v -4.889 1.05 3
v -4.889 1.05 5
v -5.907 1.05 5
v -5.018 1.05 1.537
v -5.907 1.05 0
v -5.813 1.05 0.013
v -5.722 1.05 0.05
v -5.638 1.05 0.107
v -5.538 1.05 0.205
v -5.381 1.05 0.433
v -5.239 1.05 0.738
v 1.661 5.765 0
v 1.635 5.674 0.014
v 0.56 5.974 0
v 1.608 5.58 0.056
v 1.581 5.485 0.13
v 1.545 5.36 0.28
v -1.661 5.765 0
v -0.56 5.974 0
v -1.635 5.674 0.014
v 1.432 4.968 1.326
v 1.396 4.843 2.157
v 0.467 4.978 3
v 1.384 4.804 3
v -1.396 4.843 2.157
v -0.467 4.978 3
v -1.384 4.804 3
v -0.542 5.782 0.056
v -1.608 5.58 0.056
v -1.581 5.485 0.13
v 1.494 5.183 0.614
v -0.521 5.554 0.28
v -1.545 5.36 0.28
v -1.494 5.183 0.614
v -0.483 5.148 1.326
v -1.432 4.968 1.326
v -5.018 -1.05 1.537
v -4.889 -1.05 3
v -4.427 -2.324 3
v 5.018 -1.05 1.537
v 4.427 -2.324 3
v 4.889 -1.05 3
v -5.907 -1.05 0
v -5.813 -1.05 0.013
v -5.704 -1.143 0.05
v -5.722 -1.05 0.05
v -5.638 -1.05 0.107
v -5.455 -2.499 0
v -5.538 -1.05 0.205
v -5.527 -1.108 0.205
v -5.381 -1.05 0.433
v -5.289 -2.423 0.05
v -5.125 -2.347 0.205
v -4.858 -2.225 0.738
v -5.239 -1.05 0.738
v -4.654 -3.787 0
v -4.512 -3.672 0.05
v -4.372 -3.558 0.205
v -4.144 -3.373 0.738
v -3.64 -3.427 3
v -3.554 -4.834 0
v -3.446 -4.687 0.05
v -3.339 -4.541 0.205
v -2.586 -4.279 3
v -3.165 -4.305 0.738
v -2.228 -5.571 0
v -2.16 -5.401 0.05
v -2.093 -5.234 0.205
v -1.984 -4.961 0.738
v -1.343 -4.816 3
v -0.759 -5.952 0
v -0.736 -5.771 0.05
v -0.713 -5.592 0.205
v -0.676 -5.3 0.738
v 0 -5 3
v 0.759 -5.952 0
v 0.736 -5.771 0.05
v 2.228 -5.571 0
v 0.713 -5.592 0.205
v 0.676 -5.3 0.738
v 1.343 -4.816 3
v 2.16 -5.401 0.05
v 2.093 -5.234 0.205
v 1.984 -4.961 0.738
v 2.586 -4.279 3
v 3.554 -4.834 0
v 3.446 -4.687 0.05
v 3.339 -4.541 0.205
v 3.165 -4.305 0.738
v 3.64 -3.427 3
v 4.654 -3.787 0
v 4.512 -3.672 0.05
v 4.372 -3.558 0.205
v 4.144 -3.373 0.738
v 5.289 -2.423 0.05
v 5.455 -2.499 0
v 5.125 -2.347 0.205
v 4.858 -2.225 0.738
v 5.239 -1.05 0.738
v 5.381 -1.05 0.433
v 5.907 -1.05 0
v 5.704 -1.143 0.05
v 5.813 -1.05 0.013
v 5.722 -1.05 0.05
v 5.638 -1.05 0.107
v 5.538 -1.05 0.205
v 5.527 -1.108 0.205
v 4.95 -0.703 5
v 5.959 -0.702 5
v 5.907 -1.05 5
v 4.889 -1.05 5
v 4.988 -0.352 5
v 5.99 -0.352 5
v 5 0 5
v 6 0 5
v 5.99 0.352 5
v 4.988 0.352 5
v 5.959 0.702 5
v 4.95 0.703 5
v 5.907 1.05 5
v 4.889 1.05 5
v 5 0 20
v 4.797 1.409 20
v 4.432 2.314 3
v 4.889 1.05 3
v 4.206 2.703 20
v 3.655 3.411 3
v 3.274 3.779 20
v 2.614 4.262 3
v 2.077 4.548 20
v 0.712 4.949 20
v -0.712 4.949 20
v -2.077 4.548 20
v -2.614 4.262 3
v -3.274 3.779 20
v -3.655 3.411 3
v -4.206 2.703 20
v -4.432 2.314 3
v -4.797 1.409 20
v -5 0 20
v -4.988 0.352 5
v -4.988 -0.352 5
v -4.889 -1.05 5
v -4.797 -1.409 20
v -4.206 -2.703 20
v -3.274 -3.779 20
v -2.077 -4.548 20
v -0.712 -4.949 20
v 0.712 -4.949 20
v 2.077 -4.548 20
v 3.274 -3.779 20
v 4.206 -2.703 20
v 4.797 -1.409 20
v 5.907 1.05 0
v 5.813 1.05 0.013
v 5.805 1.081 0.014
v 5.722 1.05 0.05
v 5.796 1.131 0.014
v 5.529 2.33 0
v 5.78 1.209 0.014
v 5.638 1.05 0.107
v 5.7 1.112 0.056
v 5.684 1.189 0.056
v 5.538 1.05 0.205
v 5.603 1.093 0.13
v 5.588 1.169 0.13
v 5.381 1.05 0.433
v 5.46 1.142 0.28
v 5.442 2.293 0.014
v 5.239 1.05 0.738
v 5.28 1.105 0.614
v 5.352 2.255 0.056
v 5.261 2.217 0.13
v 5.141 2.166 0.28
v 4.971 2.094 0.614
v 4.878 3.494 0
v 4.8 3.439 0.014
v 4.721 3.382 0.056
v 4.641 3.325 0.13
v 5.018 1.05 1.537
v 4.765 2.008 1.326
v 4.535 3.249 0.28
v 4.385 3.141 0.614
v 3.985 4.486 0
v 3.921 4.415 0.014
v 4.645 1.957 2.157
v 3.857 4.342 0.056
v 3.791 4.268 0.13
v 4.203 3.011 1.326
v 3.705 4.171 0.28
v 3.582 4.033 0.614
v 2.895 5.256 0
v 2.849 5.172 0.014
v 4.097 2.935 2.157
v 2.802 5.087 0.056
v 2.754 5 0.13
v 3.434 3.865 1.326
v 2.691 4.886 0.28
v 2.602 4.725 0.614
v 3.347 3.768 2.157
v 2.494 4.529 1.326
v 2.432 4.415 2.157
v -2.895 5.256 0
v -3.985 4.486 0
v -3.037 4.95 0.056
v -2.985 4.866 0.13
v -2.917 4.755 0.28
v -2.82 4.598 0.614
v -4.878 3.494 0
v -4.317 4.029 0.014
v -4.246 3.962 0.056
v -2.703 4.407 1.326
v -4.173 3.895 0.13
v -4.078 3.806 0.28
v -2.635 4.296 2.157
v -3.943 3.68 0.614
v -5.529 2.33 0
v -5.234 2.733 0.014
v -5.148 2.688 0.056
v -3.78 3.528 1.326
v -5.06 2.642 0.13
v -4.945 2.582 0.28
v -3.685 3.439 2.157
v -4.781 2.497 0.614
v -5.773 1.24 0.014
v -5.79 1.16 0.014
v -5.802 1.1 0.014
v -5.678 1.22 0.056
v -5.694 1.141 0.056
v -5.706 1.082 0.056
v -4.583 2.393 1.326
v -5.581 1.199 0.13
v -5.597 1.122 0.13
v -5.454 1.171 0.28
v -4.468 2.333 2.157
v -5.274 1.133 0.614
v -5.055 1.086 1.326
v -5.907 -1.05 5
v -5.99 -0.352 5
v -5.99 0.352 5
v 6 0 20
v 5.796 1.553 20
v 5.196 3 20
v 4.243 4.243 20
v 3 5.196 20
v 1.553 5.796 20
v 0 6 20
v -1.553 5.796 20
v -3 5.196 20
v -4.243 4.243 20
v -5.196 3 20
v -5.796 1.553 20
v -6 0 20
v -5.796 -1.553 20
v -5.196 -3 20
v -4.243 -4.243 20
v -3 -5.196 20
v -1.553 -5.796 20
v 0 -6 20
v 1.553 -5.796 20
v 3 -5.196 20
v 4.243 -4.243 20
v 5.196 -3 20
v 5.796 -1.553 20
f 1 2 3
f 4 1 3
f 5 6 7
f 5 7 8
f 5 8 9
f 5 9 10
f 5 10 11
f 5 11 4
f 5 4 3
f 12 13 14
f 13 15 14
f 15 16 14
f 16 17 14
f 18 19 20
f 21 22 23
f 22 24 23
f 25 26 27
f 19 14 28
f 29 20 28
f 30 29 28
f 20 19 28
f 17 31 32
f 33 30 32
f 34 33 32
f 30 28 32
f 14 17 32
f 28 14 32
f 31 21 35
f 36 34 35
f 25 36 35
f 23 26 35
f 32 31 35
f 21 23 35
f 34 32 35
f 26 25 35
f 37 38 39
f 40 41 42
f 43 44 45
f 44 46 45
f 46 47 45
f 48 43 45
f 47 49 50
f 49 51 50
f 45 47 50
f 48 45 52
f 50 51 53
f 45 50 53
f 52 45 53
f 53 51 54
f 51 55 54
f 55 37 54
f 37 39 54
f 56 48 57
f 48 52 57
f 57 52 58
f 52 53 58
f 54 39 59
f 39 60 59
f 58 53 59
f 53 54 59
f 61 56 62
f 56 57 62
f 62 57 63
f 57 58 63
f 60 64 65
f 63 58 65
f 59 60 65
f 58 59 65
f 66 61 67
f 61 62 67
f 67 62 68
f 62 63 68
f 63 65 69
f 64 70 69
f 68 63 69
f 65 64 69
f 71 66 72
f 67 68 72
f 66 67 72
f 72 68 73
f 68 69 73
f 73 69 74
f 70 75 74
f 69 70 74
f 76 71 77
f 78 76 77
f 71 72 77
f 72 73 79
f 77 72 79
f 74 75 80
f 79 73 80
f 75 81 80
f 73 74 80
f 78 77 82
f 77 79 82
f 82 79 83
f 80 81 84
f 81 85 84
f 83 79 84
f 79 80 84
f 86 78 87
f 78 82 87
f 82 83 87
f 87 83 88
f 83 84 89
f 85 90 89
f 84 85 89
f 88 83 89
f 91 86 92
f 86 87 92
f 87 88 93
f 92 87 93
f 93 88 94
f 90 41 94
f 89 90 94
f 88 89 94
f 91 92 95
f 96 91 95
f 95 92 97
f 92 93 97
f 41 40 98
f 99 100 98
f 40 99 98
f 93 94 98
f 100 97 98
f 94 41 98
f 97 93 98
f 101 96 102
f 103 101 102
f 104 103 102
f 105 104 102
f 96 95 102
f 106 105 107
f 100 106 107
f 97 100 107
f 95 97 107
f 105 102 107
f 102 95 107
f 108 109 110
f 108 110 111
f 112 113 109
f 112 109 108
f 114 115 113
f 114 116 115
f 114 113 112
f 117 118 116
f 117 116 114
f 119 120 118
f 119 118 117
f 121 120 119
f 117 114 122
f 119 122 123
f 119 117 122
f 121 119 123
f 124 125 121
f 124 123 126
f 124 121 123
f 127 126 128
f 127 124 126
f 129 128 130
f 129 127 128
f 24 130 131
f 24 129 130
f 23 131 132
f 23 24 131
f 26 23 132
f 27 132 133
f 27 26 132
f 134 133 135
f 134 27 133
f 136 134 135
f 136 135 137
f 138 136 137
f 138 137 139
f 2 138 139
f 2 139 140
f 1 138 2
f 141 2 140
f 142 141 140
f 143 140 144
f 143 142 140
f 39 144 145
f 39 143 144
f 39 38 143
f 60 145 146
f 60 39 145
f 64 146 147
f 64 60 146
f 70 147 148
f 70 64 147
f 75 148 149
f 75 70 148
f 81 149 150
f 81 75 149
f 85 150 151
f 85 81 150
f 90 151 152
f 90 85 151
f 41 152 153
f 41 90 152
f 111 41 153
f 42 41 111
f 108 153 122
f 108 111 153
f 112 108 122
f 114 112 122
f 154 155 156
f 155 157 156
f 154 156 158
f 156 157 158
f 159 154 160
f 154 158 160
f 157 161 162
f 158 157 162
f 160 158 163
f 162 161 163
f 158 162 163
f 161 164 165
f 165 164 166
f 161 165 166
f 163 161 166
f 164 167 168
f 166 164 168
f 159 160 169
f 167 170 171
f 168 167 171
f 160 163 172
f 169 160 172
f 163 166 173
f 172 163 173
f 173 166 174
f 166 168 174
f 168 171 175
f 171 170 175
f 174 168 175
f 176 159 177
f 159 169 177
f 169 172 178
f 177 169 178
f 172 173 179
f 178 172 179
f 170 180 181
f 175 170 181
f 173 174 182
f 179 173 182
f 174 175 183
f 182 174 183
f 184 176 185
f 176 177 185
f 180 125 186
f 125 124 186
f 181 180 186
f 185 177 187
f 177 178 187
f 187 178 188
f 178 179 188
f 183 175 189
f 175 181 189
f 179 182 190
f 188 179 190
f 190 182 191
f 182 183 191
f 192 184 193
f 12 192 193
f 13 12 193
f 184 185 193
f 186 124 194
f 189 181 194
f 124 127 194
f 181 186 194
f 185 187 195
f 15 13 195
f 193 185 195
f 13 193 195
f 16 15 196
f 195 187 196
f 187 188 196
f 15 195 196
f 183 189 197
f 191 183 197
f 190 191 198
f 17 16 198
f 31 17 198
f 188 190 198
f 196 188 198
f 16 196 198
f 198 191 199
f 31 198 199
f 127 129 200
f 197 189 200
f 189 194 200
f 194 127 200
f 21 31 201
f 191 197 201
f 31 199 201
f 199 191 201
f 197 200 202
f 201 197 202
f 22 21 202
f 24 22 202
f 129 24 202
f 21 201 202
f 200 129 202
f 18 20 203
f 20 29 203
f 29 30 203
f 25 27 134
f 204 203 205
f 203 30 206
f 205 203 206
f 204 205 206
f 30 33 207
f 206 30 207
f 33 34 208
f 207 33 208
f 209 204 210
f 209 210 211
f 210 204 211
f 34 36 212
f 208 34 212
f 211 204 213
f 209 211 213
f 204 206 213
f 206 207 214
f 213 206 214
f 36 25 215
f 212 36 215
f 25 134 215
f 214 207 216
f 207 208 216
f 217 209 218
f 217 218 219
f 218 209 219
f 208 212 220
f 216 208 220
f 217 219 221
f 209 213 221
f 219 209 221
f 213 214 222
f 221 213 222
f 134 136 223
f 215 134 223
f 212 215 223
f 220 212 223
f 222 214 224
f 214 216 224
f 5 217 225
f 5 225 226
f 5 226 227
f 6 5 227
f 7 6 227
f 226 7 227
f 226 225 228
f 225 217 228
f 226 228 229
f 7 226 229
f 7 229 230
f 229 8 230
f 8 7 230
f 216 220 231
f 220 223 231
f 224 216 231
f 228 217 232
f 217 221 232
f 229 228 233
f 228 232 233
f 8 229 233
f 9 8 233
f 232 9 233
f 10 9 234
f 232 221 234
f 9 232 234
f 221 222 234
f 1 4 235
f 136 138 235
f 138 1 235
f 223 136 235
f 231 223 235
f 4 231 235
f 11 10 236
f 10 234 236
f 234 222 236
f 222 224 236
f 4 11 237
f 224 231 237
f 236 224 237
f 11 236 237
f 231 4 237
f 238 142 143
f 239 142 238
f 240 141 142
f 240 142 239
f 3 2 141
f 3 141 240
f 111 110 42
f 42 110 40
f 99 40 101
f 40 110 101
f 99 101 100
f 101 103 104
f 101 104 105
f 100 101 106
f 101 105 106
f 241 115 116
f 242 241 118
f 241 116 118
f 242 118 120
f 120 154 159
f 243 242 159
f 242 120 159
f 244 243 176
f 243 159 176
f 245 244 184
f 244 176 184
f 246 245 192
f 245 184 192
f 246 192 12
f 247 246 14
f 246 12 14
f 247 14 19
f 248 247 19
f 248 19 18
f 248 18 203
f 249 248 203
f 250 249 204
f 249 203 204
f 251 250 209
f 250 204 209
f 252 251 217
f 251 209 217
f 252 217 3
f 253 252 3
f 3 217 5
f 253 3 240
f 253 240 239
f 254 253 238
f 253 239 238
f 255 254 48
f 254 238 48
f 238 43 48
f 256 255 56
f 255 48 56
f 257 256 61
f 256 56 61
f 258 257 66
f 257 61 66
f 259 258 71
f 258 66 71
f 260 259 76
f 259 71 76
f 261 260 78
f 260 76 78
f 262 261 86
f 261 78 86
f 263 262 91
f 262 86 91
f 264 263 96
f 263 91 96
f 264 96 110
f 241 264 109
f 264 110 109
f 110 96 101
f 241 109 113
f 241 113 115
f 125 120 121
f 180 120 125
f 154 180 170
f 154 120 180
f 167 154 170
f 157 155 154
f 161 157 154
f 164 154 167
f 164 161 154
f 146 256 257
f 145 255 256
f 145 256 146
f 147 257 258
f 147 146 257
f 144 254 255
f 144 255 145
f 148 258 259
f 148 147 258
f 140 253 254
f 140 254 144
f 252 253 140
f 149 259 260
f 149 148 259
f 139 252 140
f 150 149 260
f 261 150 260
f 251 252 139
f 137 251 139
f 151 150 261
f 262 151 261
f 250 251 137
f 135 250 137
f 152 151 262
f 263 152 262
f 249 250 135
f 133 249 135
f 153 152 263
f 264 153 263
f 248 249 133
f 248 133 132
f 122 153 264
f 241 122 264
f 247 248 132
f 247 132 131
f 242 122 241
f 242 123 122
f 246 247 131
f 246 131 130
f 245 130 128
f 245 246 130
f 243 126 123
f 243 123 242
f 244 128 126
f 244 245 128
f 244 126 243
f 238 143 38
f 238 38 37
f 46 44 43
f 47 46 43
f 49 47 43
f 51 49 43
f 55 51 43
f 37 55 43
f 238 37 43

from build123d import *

# Parameters (mm, degrees)
SKETCH1_R           = 6
SKETCH1_R_2         = 5
BOSS_EXTRUDE1_DEPTH = 20
SKETCH2_W           = 17.887562732
SKETCH2_H           = 2.1
CUT_EXTRUDE1_DEPTH  = 5
FILLET2_SIZE        = 1
FILLET2_SIZE_2      = 3


with BuildPart() as part:
    # Sketch1 → Boss-Extrude1 (new body)
    with BuildSketch(Plane.XY):
        Circle(SKETCH1_R)
        Circle(SKETCH1_R_2, mode=Mode.SUBTRACT)
    extrude(amount=BOSS_EXTRUDE1_DEPTH)

    # Sketch2 → Cut-Extrude1 (cut)
    with BuildSketch(Plane(origin=(0, 0, 0), x_dir=(-1, 0, 0), z_dir=(0, 0, -1))):
        Rectangle(SKETCH2_W, SKETCH2_H)
    extrude(amount=-CUT_EXTRUDE1_DEPTH, mode=Mode.SUBTRACT)

    # Fillet2
    # a fillet whose section is not a circle: 3, 1 mm, written as the material it takes off along each edge
    with BuildSketch(Plane(origin=(0, 0, 0), x_dir=(-0.2768991619260433, 0.9608989822685082, 0), z_dir=(0.9608989822685082, 0.2768991619260433, 0))) as fillet2_piece_1:
        with BuildLine():
            Bezier((5 + FILLET2_SIZE, 0), (5, 0), (5, FILLET2_SIZE_2), weights=[1, 0.707106781, 1])
            Line((5, FILLET2_SIZE_2), (5, 0))
            Line((5, 0), (5 + FILLET2_SIZE, 0))
        make_face()
    revolve(axis=Axis((0, 0, 0), (0, 0, 1)), revolution_arc=327.849552319, mode=Mode.SUBTRACT)
    with BuildSketch(Plane(origin=(0, 0, 0), x_dir=(0.2768991619260793, -0.9608989822684979, 0), z_dir=(-0.9608989822684979, -0.2768991619260793, 0))) as fillet2_piece_2:
        with BuildLine():
            Bezier((5 + FILLET2_SIZE, 0), (5, 0), (5, FILLET2_SIZE_2), weights=[1, 0.707106781, 1])
            Line((5, FILLET2_SIZE_2), (5, 0))
            Line((5, 0), (5 + FILLET2_SIZE, 0))
        make_face()
    revolve(axis=Axis((0, 0, 0), (0, 0, 1)), revolution_arc=327.849552319, mode=Mode.SUBTRACT)


solid = part.part
